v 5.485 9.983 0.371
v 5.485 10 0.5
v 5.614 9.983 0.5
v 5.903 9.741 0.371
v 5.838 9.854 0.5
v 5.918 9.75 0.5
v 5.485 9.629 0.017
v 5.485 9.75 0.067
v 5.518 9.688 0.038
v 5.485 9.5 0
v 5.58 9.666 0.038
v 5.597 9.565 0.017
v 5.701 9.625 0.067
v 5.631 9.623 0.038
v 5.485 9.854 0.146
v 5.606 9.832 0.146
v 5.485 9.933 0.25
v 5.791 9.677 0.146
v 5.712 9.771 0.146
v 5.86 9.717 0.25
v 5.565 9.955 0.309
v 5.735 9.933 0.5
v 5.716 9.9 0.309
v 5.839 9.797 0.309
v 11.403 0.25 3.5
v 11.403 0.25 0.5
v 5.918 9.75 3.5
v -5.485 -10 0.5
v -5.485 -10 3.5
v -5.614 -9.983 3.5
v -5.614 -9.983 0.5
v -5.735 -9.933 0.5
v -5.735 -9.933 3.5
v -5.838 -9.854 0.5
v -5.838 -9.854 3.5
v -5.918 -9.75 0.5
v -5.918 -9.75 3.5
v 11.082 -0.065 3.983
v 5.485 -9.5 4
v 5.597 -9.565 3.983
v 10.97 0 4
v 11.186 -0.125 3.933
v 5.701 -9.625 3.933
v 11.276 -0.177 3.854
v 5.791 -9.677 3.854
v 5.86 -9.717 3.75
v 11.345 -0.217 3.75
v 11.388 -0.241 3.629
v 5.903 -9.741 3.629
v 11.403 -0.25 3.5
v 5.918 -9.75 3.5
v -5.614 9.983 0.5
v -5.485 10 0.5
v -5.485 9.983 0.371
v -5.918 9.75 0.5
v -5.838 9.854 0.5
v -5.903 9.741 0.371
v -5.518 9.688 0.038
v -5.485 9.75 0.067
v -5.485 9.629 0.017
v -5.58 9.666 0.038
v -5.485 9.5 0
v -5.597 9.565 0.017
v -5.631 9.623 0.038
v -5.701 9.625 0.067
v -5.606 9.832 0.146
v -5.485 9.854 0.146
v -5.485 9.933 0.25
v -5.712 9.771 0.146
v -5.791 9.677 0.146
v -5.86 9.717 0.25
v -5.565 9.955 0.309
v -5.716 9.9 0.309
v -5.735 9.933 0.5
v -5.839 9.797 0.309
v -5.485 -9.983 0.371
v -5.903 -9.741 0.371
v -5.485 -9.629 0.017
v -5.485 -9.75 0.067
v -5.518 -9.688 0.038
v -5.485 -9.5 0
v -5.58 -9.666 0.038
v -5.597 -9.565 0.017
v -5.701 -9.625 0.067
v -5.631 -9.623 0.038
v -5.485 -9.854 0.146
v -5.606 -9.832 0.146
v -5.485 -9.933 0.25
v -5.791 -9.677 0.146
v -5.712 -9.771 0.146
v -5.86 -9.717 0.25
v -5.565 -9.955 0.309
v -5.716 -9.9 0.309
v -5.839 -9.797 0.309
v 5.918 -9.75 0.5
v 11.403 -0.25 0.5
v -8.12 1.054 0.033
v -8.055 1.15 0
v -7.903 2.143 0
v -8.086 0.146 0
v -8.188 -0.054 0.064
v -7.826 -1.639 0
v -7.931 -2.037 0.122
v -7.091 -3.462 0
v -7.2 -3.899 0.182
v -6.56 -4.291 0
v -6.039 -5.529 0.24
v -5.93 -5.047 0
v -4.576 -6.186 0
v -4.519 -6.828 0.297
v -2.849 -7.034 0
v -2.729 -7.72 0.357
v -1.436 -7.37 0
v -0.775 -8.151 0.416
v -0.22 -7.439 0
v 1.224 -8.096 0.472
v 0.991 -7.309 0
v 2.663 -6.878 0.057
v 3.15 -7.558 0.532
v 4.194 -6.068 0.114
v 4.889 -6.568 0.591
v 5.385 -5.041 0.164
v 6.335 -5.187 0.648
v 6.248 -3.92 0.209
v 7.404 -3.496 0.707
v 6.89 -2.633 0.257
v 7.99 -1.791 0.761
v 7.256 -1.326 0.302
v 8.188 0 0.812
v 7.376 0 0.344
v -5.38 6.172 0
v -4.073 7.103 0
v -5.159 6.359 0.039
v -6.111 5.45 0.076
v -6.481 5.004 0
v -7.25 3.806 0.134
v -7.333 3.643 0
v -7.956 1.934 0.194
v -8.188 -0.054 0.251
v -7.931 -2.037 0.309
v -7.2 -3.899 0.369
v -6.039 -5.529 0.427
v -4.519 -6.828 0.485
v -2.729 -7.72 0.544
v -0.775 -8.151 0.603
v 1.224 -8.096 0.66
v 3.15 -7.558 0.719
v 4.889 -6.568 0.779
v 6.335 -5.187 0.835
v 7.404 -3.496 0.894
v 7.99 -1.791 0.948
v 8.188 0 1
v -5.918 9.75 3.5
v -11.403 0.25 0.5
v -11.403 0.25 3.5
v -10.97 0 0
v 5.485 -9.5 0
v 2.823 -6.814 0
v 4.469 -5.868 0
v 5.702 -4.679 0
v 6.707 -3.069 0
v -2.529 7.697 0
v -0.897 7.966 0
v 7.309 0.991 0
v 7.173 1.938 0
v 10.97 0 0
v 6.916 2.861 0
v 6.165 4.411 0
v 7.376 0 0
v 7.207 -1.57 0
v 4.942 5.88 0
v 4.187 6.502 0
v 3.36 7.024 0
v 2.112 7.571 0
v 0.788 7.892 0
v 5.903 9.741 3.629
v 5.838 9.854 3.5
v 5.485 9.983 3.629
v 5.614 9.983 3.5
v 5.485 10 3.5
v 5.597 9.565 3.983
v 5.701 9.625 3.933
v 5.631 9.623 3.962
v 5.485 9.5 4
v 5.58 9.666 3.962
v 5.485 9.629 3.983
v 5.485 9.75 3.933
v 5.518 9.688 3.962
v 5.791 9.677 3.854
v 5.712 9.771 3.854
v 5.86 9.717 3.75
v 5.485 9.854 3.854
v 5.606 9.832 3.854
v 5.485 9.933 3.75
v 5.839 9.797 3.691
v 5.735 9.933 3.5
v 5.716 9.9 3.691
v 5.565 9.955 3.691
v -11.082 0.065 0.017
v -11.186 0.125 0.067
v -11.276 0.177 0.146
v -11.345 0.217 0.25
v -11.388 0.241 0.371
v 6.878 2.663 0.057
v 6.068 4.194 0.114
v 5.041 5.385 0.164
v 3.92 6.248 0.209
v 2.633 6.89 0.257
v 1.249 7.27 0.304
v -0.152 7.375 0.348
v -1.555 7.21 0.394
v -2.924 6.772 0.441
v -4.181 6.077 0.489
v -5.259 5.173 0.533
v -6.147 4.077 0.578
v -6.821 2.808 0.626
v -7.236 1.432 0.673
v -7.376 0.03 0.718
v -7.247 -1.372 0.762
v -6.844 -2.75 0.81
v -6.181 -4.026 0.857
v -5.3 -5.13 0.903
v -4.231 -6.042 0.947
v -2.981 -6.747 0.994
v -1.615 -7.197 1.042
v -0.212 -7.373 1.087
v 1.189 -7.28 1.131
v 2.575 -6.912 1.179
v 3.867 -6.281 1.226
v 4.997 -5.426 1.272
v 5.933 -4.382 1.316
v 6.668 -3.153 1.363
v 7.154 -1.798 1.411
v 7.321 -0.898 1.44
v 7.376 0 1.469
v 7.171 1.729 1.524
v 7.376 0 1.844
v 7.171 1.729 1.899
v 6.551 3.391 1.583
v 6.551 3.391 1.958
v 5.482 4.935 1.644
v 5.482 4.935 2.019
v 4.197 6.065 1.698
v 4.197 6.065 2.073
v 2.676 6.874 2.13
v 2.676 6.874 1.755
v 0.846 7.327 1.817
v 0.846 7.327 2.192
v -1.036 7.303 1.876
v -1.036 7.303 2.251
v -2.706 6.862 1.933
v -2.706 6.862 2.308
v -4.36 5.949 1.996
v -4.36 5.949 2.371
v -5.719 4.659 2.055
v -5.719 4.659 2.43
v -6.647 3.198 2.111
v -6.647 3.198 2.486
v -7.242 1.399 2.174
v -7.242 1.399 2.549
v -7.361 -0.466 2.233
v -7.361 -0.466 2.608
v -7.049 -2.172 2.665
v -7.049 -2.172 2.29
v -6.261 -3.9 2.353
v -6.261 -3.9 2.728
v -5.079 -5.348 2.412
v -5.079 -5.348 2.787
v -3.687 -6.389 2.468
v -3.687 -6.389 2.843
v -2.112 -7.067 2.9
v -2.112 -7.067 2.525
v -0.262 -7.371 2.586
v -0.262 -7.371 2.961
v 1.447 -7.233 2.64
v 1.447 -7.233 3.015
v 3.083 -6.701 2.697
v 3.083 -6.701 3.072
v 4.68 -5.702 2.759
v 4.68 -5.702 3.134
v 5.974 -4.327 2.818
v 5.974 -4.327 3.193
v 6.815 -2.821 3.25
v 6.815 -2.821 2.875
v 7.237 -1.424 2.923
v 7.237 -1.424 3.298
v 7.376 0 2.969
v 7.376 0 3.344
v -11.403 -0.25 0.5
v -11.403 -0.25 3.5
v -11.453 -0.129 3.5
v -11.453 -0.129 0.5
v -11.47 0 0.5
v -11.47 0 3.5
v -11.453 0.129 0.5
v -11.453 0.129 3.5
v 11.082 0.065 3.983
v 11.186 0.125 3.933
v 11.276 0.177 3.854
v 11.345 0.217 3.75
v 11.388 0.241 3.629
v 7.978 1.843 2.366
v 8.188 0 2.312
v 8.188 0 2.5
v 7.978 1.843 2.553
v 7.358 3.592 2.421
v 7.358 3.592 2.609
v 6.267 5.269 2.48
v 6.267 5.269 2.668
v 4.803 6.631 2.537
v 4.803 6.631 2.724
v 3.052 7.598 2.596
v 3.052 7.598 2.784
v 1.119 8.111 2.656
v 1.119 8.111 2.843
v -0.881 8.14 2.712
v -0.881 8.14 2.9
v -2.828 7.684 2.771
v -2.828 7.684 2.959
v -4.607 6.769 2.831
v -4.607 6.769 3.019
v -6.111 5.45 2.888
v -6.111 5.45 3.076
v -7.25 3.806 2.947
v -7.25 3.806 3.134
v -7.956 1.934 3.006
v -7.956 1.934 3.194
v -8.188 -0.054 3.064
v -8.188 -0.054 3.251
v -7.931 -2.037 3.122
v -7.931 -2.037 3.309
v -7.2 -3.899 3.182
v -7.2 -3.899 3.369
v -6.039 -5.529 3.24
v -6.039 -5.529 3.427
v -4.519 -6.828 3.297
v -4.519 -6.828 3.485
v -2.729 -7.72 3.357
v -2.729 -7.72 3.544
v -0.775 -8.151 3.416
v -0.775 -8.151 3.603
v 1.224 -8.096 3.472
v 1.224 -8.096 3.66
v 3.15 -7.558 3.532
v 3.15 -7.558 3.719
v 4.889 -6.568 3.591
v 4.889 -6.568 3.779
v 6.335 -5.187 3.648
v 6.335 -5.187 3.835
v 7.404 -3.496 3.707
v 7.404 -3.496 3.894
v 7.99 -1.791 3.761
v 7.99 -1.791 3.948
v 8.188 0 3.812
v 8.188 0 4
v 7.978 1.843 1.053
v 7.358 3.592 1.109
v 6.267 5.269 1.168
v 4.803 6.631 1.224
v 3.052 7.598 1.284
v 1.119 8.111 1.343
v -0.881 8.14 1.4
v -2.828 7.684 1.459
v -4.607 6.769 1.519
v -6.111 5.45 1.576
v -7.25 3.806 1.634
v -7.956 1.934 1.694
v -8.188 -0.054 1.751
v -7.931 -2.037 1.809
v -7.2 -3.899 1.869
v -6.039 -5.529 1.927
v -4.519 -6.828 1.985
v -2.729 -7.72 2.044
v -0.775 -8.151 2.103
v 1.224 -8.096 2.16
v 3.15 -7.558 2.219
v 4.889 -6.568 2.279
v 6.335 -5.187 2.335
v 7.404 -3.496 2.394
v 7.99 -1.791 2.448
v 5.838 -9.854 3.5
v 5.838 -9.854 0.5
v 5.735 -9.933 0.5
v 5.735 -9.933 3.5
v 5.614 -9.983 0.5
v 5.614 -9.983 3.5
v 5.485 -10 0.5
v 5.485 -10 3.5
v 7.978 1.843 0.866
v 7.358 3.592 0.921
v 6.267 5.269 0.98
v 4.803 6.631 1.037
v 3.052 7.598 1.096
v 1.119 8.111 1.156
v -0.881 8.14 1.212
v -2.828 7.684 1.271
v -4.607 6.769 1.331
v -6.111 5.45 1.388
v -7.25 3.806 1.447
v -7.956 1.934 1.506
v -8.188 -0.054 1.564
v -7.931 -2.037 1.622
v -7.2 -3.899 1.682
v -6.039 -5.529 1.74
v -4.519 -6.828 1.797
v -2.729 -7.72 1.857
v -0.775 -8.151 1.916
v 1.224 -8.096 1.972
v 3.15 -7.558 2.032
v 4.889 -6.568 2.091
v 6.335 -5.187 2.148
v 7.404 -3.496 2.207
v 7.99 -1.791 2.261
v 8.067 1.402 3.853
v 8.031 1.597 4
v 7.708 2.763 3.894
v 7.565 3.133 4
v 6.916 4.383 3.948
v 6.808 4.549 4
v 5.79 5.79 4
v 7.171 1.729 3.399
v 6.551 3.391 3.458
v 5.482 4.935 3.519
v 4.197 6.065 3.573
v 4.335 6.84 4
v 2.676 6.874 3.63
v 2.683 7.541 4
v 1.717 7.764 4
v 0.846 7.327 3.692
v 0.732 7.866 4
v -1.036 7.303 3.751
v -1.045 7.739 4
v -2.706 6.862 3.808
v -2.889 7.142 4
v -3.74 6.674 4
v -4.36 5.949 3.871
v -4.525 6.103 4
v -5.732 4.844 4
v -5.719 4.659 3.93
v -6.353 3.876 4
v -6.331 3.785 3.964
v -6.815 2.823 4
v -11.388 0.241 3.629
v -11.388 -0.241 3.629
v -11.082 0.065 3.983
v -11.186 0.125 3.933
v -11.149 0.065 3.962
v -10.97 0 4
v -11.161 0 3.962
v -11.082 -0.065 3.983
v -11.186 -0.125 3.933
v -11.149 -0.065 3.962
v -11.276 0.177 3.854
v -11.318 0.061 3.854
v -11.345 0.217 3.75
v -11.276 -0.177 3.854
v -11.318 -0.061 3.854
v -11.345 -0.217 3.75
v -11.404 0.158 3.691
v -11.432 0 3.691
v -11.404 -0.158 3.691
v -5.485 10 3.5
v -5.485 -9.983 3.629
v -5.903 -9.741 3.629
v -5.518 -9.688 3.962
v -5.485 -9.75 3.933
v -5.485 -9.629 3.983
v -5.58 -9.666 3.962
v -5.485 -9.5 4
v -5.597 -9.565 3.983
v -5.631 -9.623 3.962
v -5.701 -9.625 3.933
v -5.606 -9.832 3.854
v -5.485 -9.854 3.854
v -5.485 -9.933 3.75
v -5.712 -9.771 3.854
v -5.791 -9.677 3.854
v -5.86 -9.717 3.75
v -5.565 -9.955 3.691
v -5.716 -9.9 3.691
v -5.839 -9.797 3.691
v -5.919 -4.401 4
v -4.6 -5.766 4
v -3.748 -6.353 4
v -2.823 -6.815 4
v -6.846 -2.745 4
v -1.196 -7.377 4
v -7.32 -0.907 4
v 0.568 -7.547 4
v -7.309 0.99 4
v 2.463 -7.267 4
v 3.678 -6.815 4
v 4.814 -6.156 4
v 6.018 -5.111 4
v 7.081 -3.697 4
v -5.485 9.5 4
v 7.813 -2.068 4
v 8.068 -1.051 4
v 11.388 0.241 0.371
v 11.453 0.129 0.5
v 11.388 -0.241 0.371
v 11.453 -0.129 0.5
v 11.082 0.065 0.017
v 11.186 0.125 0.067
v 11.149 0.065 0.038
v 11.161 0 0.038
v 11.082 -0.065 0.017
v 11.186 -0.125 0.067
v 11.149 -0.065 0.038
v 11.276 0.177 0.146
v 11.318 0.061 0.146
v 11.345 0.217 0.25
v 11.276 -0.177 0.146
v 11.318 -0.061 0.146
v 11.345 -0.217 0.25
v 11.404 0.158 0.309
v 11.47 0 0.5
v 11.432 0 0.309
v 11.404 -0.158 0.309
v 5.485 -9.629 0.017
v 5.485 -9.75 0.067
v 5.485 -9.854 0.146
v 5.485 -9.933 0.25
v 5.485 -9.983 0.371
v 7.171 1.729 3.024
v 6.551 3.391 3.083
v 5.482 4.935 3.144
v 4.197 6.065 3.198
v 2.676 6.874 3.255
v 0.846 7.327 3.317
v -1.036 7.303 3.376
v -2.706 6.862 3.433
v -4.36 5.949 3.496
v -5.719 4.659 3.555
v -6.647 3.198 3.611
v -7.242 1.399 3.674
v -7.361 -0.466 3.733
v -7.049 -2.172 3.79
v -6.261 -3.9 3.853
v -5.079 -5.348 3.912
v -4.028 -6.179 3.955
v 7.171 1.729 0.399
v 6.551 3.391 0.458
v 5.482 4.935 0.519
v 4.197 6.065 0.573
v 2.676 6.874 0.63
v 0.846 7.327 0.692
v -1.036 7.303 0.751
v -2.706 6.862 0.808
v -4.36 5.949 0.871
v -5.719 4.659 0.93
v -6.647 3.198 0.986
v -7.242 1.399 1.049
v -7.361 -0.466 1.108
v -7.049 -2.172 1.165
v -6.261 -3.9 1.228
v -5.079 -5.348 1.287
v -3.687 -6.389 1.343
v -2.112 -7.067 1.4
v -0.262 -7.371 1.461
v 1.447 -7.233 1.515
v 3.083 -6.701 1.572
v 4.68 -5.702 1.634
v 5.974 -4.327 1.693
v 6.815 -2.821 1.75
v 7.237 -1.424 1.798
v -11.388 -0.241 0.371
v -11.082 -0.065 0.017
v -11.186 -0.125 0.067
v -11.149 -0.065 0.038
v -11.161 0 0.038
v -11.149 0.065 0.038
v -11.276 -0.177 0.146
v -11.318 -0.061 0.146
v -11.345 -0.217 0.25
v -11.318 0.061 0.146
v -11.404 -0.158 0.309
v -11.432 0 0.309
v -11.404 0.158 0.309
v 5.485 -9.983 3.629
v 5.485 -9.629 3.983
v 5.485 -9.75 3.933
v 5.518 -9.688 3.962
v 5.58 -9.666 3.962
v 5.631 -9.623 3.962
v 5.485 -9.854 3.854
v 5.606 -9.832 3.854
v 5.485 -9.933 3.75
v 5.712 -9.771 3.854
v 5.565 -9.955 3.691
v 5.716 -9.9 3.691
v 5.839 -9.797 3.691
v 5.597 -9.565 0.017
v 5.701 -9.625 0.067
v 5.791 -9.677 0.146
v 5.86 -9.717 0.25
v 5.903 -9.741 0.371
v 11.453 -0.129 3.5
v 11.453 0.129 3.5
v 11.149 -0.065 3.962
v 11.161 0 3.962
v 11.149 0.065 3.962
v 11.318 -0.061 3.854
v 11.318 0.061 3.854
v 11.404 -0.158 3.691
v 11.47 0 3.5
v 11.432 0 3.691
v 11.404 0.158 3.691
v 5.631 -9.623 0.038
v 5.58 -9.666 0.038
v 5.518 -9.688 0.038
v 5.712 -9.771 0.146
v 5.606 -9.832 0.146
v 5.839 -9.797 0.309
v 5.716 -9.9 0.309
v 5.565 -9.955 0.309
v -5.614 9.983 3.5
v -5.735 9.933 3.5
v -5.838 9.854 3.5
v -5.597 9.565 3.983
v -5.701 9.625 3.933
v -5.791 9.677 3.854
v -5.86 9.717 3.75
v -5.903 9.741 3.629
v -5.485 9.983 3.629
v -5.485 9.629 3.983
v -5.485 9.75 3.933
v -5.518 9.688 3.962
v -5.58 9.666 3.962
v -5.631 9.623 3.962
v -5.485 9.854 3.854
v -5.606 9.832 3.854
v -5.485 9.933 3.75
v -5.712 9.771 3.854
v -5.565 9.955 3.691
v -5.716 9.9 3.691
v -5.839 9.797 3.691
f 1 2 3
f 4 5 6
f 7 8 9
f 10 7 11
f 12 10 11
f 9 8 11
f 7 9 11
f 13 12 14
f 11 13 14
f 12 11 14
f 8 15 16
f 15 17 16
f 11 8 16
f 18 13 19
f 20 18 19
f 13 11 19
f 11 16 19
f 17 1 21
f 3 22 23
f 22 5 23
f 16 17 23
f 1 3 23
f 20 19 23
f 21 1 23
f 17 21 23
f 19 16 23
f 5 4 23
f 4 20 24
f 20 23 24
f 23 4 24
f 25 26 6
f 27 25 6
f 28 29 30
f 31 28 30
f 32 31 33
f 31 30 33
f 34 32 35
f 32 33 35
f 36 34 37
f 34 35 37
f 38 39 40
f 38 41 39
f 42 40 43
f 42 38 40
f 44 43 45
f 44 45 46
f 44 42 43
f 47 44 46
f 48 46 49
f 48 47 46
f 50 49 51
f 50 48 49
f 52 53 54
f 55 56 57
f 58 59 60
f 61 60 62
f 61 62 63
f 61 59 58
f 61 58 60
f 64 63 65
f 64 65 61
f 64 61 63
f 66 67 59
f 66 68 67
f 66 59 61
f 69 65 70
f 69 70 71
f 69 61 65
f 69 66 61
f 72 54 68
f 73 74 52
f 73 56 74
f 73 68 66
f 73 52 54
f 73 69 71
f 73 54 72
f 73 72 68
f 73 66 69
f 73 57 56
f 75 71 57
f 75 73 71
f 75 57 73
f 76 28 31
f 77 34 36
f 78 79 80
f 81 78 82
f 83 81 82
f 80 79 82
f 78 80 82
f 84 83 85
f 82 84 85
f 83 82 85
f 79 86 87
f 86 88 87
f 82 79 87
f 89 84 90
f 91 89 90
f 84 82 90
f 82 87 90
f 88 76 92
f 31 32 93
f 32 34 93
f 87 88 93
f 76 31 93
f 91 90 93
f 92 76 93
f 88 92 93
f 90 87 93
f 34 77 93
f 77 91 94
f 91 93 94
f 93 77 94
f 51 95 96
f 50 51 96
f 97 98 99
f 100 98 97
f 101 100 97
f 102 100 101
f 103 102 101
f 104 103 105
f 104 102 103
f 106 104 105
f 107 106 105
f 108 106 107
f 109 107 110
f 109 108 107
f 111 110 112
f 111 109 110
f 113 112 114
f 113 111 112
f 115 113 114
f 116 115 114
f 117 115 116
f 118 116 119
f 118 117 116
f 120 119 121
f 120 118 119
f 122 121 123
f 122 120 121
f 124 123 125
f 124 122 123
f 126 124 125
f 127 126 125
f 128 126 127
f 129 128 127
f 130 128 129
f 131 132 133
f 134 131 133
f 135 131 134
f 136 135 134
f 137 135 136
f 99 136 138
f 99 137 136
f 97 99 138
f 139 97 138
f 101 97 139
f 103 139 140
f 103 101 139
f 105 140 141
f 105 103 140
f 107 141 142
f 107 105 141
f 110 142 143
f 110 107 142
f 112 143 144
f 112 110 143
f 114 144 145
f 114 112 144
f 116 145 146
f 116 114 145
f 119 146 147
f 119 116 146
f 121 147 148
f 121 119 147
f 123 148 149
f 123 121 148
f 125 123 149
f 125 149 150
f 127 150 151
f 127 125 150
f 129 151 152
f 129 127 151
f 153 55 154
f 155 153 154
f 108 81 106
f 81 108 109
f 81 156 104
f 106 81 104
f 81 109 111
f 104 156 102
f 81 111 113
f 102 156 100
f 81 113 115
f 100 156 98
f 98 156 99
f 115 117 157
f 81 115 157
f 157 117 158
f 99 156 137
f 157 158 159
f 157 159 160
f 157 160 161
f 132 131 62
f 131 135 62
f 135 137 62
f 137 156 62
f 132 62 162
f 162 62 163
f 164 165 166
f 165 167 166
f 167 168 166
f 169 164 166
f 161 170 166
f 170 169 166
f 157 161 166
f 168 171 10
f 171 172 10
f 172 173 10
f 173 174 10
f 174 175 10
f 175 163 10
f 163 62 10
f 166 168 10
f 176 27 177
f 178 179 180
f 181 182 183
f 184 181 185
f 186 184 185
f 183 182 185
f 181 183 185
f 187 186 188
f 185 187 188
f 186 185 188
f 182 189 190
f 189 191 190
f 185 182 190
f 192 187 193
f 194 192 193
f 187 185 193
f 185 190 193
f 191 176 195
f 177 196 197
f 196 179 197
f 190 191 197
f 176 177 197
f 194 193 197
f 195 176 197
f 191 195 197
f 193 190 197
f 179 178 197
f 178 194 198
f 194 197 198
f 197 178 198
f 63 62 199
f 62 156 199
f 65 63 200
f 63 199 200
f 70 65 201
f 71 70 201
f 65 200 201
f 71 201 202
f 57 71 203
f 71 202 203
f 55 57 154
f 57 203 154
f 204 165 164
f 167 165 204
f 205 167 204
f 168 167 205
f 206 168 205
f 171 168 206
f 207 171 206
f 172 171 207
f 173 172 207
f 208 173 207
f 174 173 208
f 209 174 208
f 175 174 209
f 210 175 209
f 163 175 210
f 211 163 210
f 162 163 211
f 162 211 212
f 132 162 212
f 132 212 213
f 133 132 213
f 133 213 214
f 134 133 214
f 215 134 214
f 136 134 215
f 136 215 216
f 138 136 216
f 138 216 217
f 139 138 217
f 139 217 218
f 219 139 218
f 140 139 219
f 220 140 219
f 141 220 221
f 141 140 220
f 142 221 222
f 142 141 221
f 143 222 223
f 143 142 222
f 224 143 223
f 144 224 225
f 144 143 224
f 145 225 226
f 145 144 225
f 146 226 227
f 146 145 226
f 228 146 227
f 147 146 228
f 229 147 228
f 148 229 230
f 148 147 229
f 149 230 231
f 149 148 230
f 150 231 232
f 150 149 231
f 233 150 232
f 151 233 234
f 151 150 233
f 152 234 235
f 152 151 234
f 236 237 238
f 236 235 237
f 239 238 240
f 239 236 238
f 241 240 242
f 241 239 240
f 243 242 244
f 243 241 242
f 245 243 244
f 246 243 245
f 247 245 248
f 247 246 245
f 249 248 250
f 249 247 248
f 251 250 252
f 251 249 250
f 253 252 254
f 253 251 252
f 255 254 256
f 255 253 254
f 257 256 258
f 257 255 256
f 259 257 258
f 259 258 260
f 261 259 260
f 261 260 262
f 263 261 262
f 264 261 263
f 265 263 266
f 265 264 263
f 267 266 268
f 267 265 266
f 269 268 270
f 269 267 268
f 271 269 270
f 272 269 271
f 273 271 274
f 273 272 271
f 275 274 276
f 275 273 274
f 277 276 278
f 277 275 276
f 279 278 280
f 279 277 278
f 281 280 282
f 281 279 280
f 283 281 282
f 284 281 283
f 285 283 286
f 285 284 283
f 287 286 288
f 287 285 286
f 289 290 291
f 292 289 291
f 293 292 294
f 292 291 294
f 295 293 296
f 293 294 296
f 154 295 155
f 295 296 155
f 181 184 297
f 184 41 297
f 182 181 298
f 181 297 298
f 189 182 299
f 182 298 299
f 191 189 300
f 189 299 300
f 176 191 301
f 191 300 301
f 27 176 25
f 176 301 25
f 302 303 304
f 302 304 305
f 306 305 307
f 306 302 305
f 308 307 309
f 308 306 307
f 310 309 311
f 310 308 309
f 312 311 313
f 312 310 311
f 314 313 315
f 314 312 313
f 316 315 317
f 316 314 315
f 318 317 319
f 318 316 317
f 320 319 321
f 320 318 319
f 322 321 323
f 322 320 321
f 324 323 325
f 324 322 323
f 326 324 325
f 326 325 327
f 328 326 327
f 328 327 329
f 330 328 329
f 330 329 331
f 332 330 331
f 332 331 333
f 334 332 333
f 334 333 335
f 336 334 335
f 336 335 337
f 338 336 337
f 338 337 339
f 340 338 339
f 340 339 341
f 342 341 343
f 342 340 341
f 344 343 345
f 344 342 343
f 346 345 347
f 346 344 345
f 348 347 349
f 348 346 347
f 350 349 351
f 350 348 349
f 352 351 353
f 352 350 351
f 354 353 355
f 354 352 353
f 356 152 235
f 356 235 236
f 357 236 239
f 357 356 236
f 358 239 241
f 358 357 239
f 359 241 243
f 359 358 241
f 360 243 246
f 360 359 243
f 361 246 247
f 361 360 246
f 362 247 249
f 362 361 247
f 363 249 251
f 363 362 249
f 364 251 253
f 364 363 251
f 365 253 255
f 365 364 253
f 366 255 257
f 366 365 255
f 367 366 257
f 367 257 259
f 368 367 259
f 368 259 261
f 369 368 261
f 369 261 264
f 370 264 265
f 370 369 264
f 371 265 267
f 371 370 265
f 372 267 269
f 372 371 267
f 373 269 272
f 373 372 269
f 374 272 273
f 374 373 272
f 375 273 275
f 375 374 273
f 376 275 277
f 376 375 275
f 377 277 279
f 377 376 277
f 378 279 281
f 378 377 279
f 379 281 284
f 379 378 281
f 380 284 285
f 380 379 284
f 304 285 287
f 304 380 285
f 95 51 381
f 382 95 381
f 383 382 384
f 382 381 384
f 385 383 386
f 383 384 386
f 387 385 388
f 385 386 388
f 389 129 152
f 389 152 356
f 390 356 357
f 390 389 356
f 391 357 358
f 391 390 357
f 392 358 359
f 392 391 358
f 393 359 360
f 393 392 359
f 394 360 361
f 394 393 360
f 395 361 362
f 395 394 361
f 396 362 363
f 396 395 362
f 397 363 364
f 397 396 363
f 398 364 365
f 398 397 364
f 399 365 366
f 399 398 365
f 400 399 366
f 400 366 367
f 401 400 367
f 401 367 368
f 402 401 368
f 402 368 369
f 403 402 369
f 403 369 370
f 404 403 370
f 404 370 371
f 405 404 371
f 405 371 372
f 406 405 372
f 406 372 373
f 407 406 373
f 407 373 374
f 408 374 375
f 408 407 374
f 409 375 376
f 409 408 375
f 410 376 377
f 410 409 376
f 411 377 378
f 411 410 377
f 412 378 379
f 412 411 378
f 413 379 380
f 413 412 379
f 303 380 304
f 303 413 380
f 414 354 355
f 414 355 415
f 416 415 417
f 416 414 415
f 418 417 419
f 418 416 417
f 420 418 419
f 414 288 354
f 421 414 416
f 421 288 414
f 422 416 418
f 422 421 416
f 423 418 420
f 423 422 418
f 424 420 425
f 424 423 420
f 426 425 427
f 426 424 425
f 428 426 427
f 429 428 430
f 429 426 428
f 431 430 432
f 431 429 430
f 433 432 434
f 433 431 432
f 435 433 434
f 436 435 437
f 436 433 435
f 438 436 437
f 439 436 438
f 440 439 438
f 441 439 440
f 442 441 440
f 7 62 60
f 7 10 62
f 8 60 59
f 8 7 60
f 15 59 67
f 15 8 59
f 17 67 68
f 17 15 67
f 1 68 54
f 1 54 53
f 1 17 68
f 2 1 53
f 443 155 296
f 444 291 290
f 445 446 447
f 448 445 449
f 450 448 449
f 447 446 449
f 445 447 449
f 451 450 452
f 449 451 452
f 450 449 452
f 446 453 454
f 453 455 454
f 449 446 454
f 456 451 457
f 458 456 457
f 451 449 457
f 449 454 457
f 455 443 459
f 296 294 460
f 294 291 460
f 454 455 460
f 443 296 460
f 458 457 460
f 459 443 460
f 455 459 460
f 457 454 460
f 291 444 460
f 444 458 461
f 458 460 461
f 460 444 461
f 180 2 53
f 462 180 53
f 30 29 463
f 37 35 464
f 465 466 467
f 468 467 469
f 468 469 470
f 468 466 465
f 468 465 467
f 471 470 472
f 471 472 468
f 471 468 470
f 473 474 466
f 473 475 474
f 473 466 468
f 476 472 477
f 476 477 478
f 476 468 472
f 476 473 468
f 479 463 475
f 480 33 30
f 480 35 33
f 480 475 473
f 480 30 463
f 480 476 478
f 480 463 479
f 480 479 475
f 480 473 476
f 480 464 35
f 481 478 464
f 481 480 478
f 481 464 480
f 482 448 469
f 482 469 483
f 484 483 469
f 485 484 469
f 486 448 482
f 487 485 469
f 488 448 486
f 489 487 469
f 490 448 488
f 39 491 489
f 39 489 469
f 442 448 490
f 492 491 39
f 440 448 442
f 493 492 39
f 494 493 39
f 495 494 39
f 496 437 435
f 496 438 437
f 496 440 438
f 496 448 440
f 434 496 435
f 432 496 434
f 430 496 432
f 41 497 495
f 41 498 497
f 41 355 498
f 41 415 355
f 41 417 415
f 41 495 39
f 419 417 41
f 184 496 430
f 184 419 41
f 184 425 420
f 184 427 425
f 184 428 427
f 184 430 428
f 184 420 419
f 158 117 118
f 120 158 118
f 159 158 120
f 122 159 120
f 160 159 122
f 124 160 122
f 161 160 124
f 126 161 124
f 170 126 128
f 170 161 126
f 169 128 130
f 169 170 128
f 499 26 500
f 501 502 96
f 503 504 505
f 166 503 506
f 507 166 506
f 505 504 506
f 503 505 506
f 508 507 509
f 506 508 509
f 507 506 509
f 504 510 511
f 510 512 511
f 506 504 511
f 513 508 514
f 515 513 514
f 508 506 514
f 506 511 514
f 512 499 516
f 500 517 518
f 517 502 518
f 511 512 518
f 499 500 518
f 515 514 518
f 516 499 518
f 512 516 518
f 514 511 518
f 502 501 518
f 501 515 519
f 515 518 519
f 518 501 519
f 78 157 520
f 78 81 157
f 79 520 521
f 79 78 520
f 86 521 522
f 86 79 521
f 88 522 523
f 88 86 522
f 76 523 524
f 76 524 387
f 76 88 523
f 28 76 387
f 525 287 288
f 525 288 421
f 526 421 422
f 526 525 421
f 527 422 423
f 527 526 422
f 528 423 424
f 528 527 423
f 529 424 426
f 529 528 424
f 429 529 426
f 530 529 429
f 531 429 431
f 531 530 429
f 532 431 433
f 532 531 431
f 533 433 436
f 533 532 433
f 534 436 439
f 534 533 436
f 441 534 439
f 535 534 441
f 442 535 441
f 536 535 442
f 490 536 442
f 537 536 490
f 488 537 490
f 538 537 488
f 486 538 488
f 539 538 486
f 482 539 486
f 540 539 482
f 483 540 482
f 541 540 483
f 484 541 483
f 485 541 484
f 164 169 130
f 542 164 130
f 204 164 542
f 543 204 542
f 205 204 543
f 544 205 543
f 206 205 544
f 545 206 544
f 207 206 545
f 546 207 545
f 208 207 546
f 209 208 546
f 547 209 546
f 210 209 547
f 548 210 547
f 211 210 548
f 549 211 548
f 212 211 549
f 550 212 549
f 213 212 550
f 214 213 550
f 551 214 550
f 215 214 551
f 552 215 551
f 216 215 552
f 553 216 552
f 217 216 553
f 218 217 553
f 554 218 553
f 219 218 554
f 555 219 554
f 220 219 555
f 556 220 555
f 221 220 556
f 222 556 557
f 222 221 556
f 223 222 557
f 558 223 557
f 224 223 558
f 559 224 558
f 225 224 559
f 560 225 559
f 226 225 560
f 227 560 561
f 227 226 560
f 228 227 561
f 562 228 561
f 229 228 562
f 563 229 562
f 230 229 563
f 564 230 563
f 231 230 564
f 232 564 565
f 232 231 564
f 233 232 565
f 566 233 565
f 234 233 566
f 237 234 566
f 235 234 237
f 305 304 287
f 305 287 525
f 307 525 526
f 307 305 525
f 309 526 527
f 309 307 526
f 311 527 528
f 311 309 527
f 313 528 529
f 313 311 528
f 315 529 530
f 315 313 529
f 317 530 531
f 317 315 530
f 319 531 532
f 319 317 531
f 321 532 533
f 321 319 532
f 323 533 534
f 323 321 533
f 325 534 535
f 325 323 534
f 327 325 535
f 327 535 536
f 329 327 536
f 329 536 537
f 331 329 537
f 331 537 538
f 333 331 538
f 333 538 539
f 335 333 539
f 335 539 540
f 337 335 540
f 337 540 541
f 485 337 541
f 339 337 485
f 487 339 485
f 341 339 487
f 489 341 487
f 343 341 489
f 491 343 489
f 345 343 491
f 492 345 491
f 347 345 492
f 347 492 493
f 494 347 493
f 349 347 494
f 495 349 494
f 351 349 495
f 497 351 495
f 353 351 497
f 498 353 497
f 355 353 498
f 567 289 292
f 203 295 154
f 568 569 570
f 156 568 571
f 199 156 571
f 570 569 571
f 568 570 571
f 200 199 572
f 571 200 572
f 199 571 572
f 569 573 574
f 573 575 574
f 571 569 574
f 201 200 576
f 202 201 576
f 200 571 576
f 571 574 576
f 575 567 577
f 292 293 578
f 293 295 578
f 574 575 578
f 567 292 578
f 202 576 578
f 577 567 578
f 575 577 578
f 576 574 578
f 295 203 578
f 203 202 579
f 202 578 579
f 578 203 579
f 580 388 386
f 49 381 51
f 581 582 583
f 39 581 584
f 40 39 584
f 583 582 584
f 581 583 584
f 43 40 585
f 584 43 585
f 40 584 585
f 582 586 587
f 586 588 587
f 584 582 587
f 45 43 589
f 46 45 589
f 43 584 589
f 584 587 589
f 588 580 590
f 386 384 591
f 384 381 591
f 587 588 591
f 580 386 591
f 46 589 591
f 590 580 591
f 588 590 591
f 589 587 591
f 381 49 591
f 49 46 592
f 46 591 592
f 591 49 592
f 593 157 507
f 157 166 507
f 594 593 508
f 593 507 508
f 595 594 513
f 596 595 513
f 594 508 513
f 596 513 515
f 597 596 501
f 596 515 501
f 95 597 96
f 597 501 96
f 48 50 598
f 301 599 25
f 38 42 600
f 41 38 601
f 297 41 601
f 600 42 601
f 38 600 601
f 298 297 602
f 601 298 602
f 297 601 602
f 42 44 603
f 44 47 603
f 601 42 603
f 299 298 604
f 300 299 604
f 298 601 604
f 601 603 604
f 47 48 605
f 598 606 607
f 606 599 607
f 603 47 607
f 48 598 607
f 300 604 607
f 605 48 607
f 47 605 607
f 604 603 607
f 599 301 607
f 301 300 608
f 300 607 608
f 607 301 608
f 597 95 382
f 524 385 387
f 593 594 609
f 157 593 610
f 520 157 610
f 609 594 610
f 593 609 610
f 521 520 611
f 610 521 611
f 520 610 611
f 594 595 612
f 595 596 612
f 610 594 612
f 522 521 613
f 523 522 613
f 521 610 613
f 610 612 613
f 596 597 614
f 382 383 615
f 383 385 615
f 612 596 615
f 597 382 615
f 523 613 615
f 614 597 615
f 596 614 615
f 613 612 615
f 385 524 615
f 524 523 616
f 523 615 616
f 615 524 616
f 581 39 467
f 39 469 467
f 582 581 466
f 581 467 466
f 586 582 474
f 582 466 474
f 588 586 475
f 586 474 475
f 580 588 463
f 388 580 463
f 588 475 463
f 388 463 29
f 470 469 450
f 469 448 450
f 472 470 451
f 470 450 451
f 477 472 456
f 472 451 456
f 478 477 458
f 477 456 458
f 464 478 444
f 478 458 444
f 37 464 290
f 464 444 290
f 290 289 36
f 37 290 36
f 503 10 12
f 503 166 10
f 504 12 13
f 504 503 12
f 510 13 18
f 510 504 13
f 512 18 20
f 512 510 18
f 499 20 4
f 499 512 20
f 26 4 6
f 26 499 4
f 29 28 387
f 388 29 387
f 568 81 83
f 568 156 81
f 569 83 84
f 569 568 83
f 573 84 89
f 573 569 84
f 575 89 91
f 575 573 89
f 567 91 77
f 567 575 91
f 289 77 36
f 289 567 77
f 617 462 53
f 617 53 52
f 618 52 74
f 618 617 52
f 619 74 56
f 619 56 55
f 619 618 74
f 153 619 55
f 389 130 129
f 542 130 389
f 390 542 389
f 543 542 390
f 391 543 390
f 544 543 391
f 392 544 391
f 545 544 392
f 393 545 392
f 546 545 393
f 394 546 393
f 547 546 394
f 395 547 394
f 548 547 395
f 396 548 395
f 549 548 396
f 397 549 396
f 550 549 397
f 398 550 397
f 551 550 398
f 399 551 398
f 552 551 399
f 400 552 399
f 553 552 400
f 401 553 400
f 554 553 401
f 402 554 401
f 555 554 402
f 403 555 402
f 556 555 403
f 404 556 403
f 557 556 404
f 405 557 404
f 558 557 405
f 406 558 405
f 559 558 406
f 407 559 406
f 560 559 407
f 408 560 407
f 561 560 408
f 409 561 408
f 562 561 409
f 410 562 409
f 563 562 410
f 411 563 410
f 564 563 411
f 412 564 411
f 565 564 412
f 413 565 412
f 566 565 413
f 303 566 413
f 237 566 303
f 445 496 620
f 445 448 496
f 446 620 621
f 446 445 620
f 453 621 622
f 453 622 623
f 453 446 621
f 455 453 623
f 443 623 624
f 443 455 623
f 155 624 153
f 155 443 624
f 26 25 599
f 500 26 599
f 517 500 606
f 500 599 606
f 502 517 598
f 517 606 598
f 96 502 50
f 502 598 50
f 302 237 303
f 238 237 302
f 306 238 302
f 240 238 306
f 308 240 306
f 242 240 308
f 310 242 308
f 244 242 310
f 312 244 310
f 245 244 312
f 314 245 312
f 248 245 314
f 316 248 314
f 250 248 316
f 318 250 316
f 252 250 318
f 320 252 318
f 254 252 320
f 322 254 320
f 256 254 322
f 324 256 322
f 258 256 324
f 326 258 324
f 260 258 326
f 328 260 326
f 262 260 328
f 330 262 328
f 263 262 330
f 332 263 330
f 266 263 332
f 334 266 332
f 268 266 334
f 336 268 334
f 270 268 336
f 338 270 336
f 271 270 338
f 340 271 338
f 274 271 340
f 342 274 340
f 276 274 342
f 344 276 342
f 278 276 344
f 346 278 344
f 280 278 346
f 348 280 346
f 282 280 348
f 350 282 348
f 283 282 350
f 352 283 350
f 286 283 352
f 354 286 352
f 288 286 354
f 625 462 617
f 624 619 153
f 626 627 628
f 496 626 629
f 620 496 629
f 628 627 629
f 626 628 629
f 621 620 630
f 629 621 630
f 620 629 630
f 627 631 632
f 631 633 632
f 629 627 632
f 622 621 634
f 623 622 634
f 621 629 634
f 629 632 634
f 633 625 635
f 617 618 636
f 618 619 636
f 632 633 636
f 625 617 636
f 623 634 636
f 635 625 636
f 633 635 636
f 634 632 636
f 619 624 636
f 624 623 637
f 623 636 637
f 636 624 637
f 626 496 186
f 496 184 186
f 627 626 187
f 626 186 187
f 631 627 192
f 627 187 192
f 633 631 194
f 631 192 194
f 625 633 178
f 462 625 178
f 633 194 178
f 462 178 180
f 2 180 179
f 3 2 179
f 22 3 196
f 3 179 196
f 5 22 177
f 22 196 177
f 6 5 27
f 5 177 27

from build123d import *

# Parameters (mm, degrees)
SKIZZE1_R                       = 8.188
AUFSATZ_LINEAR_AUSTRAGEN1_DEPTH = 4
GEWINDE1_PITCH                  = 1.5
SKIZZE7_W                       = 5.280408975
SKIZZE7_H                       = 21.060699533
SKIZZE7_W_2                     = 5.818663971
SKIZZE7_H_2                     = 21.896441579
SCHNITT_LINEAR_AUSTRAGEN1_DEPTH = 26.720766668
VERRUNDUNG1_R                   = 0.5


with BuildPart() as part:
    # Skizze1 → Aufsatz-Linear austragen1 (new body)
    with BuildSketch(Plane.XY):
        Polygon((-11.547005384, 0), (-5.773502692, -10), (5.773502692, -10), (11.547005384, 0), (5.773502692, 10), (-5.773502692, 10), align=None)
        Circle(SKIZZE1_R, mode=Mode.SUBTRACT)
    extrude(amount=AUFSATZ_LINEAR_AUSTRAGEN1_DEPTH)

    # Gewinde1: the profile of Gewindeprofil1 profile screwed along a right-hand helix of 4 turns, 8 arcs to a turn; built about Z, then put on its axis
    gewinde1_z = Axis((0, 0, 0), (0, 0, 1))
    gewinde1_corners = [(8.1883, 0, -0.000173205), (8.1883, 0, 1.312673201), (7.376101188, 0, 0.843749998), (7.376101188, 0, 0.468749998)]
    with BuildLine(mode=Mode.PRIVATE) as gewinde1_profile:
        Line(gewinde1_corners[0], gewinde1_corners[1])
        Line(gewinde1_corners[1], gewinde1_corners[2])
        Line(gewinde1_corners[2], gewinde1_corners[3])
        Line(gewinde1_corners[3], gewinde1_corners[0])
    gewinde1_cap = Face(gewinde1_profile.wire())
    gewinde1_turn_angles = [0, 22.5, 45, 67.5, 90, 112.5, 135, 157.5, 180, 202.5, 225, 247.5, 270, 292.5, 315, 337.5, 360]
    gewinde1_turn_weights = [1, 0.9238795325112867, 1, 0.9238795325112867, 1, 0.9238795325112867, 1, 0.9238795325112867, 1, 0.9238795325112867, 1, 0.9238795325112867, 1, 0.9238795325112867, 1, 0.9238795325112867, 1]
    gewinde1_turn_rails = [Edge.make_bspline([Vector(p[0], p[1], 0).rotate(gewinde1_z, gewinde1_turn_angles[k]) / gewinde1_turn_weights[k] + Vector(0, 0, p[2] + GEWINDE1_PITCH * gewinde1_turn_angles[k] / 360) for k in range(17)], [0, 0, 0, 1, 1, 2, 2, 3, 3, 4, 4, 5, 5, 6, 6, 7, 7, 8, 8, 8], 2, gewinde1_turn_weights) for p in gewinde1_corners]
    gewinde1_turn_sides = [Face.make_surface_from_curves(gewinde1_turn_rails[p[0]], gewinde1_turn_rails[p[1]]) for p in [(0, 1), (1, 2), (2, 3), (3, 0)]]
    gewinde1 = Plane(origin=(0, 0, -2), x_dir=(1, 0, 0), z_dir=(0, 0, 1)) * Solid(Shell([*[p.moved(Location((0, 0, GEWINDE1_PITCH * i))) for i in range(4) for p in gewinde1_turn_sides], gewinde1_cap, gewinde1_cap.rotate(gewinde1_z, 1440).moved(Location((0, 0, GEWINDE1_PITCH * 1440 / 360)))]))
    add(gewinde1)

    # Skizze7 → Schnitt-Linear austragen1 (cut, through all)
    with BuildSketch(Plane(origin=(-8.660254038, 5, 0), x_dir=(0, 0, 1), z_dir=(-0.8660254037844415, 0.49999999999999517, 0))):
        with Locations((-2.640204488, 0.585019432)):
            Rectangle(SKIZZE7_W, SKIZZE7_H)
        with Locations((6.909331986, -0.222864546)):
            Rectangle(SKIZZE7_W_2, SKIZZE7_H_2)
    extrude(amount=-SCHNITT_LINEAR_AUSTRAGEN1_DEPTH, mode=Mode.SUBTRACT)

    # Verrundung1
    verrundung1_edges = [part.edges().sort_by_distance(p)[0] for p in [
        (-5.773502692, 10, 2),
        (5.773502692, 10, 2),
        (11.547005384, 0, 2),
        (5.773502692, -10, 2),
        (-5.773502692, -10, 2),
        (-11.547005384, 0, 2),
        (0, -10, 4),
        (8.660254038, -5, 4),
        (8.660254038, 5, 4),
        (0, 10, 4),
        (-8.660254038, 5, 4),
        (0, 10, 0),
        (8.660254038, 5, 0),
        (8.660254038, -5, 0),
        (0, -10, 0),
        (-8.660254038, -5, 0),
        (-8.660254038, 5, 0),
        (-8.660254038, -5, 4),
    ]]
    fillet(verrundung1_edges, radius=VERRUNDUNG1_R)


solid = part.part
